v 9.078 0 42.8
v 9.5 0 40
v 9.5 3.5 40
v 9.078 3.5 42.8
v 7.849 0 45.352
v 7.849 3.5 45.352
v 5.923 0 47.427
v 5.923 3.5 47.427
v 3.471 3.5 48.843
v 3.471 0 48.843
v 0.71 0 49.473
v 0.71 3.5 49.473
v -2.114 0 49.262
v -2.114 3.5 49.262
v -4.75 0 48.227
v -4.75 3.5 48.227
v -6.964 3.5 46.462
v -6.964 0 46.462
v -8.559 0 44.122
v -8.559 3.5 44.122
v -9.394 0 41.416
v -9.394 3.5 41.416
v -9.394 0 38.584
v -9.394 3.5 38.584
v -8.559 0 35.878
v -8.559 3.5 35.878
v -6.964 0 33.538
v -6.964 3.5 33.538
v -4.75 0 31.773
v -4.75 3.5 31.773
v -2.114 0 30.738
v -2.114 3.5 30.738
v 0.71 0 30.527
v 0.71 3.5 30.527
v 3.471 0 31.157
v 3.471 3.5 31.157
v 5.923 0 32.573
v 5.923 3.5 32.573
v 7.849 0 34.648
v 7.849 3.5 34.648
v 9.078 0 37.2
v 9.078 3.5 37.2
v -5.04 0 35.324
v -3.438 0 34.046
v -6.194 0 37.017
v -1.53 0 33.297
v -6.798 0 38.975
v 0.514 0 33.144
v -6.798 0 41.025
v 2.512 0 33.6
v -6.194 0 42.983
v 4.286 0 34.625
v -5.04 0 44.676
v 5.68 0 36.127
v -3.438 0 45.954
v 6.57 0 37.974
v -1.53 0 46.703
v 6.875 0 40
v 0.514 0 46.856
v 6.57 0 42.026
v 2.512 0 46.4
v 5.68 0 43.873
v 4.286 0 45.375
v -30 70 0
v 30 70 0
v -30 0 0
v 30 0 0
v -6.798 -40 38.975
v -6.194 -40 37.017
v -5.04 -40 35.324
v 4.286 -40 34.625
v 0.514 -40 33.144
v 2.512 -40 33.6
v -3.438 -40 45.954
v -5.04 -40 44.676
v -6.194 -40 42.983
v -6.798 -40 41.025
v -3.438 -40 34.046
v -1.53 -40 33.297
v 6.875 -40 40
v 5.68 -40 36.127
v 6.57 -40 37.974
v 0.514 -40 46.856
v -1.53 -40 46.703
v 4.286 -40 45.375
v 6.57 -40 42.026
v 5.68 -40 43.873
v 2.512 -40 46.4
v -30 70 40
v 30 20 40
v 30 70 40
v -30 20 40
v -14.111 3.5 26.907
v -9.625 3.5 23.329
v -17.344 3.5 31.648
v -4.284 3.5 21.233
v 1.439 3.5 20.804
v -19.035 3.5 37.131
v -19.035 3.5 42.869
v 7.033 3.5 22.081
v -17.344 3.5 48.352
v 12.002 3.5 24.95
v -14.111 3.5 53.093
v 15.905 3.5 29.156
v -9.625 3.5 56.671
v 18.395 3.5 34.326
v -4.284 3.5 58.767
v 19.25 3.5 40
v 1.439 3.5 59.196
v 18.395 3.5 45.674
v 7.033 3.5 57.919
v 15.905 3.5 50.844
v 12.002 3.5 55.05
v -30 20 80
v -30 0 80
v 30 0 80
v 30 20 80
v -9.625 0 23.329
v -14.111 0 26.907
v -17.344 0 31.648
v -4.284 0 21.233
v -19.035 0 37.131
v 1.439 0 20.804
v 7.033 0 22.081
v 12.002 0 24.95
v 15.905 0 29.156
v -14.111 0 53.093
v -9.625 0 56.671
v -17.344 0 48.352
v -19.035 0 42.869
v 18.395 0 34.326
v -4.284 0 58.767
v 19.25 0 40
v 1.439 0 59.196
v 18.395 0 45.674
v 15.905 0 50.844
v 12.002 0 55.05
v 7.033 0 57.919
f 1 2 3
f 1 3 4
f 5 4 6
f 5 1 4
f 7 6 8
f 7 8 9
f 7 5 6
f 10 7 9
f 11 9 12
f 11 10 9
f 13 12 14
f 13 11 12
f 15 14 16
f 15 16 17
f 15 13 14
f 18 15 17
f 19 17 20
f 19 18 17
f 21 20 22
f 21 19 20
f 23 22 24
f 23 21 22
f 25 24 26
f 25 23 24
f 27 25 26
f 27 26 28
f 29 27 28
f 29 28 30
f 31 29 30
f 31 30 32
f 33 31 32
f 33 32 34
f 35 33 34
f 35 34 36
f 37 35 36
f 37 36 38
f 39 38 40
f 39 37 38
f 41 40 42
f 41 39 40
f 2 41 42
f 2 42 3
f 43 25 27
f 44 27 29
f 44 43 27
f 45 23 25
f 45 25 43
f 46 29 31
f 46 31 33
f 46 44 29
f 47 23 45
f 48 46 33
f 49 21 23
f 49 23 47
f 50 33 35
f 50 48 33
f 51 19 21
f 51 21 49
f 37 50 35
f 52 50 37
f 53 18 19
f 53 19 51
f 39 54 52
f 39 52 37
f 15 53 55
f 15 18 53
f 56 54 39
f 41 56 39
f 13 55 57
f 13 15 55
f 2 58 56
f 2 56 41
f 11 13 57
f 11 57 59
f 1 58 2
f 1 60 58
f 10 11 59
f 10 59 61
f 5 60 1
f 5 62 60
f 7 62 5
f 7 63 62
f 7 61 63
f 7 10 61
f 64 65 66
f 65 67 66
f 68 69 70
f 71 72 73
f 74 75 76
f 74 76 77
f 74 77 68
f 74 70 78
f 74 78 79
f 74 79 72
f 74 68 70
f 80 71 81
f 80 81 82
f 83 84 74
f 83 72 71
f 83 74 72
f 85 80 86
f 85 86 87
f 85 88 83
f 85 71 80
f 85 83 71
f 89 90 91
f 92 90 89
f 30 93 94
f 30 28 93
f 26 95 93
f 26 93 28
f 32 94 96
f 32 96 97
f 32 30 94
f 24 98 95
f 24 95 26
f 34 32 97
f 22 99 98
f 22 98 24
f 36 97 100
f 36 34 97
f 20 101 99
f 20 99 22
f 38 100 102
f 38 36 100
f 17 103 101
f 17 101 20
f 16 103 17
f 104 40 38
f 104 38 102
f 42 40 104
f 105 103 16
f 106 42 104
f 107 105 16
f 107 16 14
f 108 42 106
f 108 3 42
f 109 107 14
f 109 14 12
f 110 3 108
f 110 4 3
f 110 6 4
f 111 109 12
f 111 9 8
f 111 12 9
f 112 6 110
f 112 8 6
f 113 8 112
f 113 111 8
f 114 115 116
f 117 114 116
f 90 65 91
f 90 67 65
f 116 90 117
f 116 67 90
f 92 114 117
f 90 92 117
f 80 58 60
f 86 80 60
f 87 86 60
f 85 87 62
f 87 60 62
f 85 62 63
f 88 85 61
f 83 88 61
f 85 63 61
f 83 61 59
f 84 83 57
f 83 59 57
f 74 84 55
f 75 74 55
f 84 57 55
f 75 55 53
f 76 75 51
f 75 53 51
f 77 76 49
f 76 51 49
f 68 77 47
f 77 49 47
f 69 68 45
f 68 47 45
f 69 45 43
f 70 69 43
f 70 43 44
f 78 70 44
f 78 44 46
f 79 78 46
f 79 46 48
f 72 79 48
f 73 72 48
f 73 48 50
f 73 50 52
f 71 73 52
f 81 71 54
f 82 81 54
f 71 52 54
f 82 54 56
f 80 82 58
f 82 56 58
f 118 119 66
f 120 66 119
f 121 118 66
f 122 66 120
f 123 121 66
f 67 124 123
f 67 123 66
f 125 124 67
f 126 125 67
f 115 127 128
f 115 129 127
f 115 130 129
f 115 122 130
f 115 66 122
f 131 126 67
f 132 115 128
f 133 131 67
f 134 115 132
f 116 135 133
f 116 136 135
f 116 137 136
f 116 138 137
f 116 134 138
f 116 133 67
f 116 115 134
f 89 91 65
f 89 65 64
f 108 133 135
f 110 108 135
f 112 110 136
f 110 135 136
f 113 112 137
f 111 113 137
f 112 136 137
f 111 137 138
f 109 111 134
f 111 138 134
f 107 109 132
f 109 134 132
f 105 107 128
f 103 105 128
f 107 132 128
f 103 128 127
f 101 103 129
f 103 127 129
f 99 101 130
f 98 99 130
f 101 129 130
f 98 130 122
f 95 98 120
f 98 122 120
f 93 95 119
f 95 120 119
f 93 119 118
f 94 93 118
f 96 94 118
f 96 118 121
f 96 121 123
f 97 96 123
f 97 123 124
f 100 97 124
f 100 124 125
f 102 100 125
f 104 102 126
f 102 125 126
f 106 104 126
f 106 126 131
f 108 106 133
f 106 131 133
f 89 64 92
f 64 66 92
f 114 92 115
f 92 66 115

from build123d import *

# Parameters (mm, degrees)
F0_R     = 6.875
F1_DEPTH = 40
F0_W     = 60
F0_H     = 80
F2_DEPTH = 20
F3_R     = 19.25
F3_R_2   = 9.5
F4_DEPTH = 3.5
F5_W     = 60
F5_H     = 40
F6_DEPTH = 50


with BuildPart() as f1:
    # F0 (on Front) → F1 (new body)
    with BuildSketch(Plane.XZ):
        with Locations((0, 40)):
            Circle(F0_R)
    extrude(amount=F1_DEPTH)

    # F0 (on Front) → F2 (join)
    with BuildSketch(Plane.XZ):
        with Locations((0, 40)):
            Rectangle(F0_W, F0_H)
        with Locations((0, 40)):
            Circle(F0_R, mode=Mode.SUBTRACT)
        with Locations((0, 40)):
            Circle(F0_R)
    extrude(amount=-F2_DEPTH)

    # F3 (on face) → F4 (cut)
    with BuildSketch(Plane.XZ):
        with Locations((0, 40)):
            Circle(F3_R)
        with Locations((0, 40)):
            Circle(F3_R_2, mode=Mode.SUBTRACT)
    extrude(amount=-F4_DEPTH, mode=Mode.SUBTRACT)

    # F5 (on face) → F6 (join)
    with BuildSketch(Plane(origin=(0, 20, 0), x_dir=(-1, 0, 0), z_dir=(0, 1, 0))):
        with Locations((0, 20)):
            Rectangle(F5_W, F5_H)
    extrude(amount=F6_DEPTH)


solid = f1.part
